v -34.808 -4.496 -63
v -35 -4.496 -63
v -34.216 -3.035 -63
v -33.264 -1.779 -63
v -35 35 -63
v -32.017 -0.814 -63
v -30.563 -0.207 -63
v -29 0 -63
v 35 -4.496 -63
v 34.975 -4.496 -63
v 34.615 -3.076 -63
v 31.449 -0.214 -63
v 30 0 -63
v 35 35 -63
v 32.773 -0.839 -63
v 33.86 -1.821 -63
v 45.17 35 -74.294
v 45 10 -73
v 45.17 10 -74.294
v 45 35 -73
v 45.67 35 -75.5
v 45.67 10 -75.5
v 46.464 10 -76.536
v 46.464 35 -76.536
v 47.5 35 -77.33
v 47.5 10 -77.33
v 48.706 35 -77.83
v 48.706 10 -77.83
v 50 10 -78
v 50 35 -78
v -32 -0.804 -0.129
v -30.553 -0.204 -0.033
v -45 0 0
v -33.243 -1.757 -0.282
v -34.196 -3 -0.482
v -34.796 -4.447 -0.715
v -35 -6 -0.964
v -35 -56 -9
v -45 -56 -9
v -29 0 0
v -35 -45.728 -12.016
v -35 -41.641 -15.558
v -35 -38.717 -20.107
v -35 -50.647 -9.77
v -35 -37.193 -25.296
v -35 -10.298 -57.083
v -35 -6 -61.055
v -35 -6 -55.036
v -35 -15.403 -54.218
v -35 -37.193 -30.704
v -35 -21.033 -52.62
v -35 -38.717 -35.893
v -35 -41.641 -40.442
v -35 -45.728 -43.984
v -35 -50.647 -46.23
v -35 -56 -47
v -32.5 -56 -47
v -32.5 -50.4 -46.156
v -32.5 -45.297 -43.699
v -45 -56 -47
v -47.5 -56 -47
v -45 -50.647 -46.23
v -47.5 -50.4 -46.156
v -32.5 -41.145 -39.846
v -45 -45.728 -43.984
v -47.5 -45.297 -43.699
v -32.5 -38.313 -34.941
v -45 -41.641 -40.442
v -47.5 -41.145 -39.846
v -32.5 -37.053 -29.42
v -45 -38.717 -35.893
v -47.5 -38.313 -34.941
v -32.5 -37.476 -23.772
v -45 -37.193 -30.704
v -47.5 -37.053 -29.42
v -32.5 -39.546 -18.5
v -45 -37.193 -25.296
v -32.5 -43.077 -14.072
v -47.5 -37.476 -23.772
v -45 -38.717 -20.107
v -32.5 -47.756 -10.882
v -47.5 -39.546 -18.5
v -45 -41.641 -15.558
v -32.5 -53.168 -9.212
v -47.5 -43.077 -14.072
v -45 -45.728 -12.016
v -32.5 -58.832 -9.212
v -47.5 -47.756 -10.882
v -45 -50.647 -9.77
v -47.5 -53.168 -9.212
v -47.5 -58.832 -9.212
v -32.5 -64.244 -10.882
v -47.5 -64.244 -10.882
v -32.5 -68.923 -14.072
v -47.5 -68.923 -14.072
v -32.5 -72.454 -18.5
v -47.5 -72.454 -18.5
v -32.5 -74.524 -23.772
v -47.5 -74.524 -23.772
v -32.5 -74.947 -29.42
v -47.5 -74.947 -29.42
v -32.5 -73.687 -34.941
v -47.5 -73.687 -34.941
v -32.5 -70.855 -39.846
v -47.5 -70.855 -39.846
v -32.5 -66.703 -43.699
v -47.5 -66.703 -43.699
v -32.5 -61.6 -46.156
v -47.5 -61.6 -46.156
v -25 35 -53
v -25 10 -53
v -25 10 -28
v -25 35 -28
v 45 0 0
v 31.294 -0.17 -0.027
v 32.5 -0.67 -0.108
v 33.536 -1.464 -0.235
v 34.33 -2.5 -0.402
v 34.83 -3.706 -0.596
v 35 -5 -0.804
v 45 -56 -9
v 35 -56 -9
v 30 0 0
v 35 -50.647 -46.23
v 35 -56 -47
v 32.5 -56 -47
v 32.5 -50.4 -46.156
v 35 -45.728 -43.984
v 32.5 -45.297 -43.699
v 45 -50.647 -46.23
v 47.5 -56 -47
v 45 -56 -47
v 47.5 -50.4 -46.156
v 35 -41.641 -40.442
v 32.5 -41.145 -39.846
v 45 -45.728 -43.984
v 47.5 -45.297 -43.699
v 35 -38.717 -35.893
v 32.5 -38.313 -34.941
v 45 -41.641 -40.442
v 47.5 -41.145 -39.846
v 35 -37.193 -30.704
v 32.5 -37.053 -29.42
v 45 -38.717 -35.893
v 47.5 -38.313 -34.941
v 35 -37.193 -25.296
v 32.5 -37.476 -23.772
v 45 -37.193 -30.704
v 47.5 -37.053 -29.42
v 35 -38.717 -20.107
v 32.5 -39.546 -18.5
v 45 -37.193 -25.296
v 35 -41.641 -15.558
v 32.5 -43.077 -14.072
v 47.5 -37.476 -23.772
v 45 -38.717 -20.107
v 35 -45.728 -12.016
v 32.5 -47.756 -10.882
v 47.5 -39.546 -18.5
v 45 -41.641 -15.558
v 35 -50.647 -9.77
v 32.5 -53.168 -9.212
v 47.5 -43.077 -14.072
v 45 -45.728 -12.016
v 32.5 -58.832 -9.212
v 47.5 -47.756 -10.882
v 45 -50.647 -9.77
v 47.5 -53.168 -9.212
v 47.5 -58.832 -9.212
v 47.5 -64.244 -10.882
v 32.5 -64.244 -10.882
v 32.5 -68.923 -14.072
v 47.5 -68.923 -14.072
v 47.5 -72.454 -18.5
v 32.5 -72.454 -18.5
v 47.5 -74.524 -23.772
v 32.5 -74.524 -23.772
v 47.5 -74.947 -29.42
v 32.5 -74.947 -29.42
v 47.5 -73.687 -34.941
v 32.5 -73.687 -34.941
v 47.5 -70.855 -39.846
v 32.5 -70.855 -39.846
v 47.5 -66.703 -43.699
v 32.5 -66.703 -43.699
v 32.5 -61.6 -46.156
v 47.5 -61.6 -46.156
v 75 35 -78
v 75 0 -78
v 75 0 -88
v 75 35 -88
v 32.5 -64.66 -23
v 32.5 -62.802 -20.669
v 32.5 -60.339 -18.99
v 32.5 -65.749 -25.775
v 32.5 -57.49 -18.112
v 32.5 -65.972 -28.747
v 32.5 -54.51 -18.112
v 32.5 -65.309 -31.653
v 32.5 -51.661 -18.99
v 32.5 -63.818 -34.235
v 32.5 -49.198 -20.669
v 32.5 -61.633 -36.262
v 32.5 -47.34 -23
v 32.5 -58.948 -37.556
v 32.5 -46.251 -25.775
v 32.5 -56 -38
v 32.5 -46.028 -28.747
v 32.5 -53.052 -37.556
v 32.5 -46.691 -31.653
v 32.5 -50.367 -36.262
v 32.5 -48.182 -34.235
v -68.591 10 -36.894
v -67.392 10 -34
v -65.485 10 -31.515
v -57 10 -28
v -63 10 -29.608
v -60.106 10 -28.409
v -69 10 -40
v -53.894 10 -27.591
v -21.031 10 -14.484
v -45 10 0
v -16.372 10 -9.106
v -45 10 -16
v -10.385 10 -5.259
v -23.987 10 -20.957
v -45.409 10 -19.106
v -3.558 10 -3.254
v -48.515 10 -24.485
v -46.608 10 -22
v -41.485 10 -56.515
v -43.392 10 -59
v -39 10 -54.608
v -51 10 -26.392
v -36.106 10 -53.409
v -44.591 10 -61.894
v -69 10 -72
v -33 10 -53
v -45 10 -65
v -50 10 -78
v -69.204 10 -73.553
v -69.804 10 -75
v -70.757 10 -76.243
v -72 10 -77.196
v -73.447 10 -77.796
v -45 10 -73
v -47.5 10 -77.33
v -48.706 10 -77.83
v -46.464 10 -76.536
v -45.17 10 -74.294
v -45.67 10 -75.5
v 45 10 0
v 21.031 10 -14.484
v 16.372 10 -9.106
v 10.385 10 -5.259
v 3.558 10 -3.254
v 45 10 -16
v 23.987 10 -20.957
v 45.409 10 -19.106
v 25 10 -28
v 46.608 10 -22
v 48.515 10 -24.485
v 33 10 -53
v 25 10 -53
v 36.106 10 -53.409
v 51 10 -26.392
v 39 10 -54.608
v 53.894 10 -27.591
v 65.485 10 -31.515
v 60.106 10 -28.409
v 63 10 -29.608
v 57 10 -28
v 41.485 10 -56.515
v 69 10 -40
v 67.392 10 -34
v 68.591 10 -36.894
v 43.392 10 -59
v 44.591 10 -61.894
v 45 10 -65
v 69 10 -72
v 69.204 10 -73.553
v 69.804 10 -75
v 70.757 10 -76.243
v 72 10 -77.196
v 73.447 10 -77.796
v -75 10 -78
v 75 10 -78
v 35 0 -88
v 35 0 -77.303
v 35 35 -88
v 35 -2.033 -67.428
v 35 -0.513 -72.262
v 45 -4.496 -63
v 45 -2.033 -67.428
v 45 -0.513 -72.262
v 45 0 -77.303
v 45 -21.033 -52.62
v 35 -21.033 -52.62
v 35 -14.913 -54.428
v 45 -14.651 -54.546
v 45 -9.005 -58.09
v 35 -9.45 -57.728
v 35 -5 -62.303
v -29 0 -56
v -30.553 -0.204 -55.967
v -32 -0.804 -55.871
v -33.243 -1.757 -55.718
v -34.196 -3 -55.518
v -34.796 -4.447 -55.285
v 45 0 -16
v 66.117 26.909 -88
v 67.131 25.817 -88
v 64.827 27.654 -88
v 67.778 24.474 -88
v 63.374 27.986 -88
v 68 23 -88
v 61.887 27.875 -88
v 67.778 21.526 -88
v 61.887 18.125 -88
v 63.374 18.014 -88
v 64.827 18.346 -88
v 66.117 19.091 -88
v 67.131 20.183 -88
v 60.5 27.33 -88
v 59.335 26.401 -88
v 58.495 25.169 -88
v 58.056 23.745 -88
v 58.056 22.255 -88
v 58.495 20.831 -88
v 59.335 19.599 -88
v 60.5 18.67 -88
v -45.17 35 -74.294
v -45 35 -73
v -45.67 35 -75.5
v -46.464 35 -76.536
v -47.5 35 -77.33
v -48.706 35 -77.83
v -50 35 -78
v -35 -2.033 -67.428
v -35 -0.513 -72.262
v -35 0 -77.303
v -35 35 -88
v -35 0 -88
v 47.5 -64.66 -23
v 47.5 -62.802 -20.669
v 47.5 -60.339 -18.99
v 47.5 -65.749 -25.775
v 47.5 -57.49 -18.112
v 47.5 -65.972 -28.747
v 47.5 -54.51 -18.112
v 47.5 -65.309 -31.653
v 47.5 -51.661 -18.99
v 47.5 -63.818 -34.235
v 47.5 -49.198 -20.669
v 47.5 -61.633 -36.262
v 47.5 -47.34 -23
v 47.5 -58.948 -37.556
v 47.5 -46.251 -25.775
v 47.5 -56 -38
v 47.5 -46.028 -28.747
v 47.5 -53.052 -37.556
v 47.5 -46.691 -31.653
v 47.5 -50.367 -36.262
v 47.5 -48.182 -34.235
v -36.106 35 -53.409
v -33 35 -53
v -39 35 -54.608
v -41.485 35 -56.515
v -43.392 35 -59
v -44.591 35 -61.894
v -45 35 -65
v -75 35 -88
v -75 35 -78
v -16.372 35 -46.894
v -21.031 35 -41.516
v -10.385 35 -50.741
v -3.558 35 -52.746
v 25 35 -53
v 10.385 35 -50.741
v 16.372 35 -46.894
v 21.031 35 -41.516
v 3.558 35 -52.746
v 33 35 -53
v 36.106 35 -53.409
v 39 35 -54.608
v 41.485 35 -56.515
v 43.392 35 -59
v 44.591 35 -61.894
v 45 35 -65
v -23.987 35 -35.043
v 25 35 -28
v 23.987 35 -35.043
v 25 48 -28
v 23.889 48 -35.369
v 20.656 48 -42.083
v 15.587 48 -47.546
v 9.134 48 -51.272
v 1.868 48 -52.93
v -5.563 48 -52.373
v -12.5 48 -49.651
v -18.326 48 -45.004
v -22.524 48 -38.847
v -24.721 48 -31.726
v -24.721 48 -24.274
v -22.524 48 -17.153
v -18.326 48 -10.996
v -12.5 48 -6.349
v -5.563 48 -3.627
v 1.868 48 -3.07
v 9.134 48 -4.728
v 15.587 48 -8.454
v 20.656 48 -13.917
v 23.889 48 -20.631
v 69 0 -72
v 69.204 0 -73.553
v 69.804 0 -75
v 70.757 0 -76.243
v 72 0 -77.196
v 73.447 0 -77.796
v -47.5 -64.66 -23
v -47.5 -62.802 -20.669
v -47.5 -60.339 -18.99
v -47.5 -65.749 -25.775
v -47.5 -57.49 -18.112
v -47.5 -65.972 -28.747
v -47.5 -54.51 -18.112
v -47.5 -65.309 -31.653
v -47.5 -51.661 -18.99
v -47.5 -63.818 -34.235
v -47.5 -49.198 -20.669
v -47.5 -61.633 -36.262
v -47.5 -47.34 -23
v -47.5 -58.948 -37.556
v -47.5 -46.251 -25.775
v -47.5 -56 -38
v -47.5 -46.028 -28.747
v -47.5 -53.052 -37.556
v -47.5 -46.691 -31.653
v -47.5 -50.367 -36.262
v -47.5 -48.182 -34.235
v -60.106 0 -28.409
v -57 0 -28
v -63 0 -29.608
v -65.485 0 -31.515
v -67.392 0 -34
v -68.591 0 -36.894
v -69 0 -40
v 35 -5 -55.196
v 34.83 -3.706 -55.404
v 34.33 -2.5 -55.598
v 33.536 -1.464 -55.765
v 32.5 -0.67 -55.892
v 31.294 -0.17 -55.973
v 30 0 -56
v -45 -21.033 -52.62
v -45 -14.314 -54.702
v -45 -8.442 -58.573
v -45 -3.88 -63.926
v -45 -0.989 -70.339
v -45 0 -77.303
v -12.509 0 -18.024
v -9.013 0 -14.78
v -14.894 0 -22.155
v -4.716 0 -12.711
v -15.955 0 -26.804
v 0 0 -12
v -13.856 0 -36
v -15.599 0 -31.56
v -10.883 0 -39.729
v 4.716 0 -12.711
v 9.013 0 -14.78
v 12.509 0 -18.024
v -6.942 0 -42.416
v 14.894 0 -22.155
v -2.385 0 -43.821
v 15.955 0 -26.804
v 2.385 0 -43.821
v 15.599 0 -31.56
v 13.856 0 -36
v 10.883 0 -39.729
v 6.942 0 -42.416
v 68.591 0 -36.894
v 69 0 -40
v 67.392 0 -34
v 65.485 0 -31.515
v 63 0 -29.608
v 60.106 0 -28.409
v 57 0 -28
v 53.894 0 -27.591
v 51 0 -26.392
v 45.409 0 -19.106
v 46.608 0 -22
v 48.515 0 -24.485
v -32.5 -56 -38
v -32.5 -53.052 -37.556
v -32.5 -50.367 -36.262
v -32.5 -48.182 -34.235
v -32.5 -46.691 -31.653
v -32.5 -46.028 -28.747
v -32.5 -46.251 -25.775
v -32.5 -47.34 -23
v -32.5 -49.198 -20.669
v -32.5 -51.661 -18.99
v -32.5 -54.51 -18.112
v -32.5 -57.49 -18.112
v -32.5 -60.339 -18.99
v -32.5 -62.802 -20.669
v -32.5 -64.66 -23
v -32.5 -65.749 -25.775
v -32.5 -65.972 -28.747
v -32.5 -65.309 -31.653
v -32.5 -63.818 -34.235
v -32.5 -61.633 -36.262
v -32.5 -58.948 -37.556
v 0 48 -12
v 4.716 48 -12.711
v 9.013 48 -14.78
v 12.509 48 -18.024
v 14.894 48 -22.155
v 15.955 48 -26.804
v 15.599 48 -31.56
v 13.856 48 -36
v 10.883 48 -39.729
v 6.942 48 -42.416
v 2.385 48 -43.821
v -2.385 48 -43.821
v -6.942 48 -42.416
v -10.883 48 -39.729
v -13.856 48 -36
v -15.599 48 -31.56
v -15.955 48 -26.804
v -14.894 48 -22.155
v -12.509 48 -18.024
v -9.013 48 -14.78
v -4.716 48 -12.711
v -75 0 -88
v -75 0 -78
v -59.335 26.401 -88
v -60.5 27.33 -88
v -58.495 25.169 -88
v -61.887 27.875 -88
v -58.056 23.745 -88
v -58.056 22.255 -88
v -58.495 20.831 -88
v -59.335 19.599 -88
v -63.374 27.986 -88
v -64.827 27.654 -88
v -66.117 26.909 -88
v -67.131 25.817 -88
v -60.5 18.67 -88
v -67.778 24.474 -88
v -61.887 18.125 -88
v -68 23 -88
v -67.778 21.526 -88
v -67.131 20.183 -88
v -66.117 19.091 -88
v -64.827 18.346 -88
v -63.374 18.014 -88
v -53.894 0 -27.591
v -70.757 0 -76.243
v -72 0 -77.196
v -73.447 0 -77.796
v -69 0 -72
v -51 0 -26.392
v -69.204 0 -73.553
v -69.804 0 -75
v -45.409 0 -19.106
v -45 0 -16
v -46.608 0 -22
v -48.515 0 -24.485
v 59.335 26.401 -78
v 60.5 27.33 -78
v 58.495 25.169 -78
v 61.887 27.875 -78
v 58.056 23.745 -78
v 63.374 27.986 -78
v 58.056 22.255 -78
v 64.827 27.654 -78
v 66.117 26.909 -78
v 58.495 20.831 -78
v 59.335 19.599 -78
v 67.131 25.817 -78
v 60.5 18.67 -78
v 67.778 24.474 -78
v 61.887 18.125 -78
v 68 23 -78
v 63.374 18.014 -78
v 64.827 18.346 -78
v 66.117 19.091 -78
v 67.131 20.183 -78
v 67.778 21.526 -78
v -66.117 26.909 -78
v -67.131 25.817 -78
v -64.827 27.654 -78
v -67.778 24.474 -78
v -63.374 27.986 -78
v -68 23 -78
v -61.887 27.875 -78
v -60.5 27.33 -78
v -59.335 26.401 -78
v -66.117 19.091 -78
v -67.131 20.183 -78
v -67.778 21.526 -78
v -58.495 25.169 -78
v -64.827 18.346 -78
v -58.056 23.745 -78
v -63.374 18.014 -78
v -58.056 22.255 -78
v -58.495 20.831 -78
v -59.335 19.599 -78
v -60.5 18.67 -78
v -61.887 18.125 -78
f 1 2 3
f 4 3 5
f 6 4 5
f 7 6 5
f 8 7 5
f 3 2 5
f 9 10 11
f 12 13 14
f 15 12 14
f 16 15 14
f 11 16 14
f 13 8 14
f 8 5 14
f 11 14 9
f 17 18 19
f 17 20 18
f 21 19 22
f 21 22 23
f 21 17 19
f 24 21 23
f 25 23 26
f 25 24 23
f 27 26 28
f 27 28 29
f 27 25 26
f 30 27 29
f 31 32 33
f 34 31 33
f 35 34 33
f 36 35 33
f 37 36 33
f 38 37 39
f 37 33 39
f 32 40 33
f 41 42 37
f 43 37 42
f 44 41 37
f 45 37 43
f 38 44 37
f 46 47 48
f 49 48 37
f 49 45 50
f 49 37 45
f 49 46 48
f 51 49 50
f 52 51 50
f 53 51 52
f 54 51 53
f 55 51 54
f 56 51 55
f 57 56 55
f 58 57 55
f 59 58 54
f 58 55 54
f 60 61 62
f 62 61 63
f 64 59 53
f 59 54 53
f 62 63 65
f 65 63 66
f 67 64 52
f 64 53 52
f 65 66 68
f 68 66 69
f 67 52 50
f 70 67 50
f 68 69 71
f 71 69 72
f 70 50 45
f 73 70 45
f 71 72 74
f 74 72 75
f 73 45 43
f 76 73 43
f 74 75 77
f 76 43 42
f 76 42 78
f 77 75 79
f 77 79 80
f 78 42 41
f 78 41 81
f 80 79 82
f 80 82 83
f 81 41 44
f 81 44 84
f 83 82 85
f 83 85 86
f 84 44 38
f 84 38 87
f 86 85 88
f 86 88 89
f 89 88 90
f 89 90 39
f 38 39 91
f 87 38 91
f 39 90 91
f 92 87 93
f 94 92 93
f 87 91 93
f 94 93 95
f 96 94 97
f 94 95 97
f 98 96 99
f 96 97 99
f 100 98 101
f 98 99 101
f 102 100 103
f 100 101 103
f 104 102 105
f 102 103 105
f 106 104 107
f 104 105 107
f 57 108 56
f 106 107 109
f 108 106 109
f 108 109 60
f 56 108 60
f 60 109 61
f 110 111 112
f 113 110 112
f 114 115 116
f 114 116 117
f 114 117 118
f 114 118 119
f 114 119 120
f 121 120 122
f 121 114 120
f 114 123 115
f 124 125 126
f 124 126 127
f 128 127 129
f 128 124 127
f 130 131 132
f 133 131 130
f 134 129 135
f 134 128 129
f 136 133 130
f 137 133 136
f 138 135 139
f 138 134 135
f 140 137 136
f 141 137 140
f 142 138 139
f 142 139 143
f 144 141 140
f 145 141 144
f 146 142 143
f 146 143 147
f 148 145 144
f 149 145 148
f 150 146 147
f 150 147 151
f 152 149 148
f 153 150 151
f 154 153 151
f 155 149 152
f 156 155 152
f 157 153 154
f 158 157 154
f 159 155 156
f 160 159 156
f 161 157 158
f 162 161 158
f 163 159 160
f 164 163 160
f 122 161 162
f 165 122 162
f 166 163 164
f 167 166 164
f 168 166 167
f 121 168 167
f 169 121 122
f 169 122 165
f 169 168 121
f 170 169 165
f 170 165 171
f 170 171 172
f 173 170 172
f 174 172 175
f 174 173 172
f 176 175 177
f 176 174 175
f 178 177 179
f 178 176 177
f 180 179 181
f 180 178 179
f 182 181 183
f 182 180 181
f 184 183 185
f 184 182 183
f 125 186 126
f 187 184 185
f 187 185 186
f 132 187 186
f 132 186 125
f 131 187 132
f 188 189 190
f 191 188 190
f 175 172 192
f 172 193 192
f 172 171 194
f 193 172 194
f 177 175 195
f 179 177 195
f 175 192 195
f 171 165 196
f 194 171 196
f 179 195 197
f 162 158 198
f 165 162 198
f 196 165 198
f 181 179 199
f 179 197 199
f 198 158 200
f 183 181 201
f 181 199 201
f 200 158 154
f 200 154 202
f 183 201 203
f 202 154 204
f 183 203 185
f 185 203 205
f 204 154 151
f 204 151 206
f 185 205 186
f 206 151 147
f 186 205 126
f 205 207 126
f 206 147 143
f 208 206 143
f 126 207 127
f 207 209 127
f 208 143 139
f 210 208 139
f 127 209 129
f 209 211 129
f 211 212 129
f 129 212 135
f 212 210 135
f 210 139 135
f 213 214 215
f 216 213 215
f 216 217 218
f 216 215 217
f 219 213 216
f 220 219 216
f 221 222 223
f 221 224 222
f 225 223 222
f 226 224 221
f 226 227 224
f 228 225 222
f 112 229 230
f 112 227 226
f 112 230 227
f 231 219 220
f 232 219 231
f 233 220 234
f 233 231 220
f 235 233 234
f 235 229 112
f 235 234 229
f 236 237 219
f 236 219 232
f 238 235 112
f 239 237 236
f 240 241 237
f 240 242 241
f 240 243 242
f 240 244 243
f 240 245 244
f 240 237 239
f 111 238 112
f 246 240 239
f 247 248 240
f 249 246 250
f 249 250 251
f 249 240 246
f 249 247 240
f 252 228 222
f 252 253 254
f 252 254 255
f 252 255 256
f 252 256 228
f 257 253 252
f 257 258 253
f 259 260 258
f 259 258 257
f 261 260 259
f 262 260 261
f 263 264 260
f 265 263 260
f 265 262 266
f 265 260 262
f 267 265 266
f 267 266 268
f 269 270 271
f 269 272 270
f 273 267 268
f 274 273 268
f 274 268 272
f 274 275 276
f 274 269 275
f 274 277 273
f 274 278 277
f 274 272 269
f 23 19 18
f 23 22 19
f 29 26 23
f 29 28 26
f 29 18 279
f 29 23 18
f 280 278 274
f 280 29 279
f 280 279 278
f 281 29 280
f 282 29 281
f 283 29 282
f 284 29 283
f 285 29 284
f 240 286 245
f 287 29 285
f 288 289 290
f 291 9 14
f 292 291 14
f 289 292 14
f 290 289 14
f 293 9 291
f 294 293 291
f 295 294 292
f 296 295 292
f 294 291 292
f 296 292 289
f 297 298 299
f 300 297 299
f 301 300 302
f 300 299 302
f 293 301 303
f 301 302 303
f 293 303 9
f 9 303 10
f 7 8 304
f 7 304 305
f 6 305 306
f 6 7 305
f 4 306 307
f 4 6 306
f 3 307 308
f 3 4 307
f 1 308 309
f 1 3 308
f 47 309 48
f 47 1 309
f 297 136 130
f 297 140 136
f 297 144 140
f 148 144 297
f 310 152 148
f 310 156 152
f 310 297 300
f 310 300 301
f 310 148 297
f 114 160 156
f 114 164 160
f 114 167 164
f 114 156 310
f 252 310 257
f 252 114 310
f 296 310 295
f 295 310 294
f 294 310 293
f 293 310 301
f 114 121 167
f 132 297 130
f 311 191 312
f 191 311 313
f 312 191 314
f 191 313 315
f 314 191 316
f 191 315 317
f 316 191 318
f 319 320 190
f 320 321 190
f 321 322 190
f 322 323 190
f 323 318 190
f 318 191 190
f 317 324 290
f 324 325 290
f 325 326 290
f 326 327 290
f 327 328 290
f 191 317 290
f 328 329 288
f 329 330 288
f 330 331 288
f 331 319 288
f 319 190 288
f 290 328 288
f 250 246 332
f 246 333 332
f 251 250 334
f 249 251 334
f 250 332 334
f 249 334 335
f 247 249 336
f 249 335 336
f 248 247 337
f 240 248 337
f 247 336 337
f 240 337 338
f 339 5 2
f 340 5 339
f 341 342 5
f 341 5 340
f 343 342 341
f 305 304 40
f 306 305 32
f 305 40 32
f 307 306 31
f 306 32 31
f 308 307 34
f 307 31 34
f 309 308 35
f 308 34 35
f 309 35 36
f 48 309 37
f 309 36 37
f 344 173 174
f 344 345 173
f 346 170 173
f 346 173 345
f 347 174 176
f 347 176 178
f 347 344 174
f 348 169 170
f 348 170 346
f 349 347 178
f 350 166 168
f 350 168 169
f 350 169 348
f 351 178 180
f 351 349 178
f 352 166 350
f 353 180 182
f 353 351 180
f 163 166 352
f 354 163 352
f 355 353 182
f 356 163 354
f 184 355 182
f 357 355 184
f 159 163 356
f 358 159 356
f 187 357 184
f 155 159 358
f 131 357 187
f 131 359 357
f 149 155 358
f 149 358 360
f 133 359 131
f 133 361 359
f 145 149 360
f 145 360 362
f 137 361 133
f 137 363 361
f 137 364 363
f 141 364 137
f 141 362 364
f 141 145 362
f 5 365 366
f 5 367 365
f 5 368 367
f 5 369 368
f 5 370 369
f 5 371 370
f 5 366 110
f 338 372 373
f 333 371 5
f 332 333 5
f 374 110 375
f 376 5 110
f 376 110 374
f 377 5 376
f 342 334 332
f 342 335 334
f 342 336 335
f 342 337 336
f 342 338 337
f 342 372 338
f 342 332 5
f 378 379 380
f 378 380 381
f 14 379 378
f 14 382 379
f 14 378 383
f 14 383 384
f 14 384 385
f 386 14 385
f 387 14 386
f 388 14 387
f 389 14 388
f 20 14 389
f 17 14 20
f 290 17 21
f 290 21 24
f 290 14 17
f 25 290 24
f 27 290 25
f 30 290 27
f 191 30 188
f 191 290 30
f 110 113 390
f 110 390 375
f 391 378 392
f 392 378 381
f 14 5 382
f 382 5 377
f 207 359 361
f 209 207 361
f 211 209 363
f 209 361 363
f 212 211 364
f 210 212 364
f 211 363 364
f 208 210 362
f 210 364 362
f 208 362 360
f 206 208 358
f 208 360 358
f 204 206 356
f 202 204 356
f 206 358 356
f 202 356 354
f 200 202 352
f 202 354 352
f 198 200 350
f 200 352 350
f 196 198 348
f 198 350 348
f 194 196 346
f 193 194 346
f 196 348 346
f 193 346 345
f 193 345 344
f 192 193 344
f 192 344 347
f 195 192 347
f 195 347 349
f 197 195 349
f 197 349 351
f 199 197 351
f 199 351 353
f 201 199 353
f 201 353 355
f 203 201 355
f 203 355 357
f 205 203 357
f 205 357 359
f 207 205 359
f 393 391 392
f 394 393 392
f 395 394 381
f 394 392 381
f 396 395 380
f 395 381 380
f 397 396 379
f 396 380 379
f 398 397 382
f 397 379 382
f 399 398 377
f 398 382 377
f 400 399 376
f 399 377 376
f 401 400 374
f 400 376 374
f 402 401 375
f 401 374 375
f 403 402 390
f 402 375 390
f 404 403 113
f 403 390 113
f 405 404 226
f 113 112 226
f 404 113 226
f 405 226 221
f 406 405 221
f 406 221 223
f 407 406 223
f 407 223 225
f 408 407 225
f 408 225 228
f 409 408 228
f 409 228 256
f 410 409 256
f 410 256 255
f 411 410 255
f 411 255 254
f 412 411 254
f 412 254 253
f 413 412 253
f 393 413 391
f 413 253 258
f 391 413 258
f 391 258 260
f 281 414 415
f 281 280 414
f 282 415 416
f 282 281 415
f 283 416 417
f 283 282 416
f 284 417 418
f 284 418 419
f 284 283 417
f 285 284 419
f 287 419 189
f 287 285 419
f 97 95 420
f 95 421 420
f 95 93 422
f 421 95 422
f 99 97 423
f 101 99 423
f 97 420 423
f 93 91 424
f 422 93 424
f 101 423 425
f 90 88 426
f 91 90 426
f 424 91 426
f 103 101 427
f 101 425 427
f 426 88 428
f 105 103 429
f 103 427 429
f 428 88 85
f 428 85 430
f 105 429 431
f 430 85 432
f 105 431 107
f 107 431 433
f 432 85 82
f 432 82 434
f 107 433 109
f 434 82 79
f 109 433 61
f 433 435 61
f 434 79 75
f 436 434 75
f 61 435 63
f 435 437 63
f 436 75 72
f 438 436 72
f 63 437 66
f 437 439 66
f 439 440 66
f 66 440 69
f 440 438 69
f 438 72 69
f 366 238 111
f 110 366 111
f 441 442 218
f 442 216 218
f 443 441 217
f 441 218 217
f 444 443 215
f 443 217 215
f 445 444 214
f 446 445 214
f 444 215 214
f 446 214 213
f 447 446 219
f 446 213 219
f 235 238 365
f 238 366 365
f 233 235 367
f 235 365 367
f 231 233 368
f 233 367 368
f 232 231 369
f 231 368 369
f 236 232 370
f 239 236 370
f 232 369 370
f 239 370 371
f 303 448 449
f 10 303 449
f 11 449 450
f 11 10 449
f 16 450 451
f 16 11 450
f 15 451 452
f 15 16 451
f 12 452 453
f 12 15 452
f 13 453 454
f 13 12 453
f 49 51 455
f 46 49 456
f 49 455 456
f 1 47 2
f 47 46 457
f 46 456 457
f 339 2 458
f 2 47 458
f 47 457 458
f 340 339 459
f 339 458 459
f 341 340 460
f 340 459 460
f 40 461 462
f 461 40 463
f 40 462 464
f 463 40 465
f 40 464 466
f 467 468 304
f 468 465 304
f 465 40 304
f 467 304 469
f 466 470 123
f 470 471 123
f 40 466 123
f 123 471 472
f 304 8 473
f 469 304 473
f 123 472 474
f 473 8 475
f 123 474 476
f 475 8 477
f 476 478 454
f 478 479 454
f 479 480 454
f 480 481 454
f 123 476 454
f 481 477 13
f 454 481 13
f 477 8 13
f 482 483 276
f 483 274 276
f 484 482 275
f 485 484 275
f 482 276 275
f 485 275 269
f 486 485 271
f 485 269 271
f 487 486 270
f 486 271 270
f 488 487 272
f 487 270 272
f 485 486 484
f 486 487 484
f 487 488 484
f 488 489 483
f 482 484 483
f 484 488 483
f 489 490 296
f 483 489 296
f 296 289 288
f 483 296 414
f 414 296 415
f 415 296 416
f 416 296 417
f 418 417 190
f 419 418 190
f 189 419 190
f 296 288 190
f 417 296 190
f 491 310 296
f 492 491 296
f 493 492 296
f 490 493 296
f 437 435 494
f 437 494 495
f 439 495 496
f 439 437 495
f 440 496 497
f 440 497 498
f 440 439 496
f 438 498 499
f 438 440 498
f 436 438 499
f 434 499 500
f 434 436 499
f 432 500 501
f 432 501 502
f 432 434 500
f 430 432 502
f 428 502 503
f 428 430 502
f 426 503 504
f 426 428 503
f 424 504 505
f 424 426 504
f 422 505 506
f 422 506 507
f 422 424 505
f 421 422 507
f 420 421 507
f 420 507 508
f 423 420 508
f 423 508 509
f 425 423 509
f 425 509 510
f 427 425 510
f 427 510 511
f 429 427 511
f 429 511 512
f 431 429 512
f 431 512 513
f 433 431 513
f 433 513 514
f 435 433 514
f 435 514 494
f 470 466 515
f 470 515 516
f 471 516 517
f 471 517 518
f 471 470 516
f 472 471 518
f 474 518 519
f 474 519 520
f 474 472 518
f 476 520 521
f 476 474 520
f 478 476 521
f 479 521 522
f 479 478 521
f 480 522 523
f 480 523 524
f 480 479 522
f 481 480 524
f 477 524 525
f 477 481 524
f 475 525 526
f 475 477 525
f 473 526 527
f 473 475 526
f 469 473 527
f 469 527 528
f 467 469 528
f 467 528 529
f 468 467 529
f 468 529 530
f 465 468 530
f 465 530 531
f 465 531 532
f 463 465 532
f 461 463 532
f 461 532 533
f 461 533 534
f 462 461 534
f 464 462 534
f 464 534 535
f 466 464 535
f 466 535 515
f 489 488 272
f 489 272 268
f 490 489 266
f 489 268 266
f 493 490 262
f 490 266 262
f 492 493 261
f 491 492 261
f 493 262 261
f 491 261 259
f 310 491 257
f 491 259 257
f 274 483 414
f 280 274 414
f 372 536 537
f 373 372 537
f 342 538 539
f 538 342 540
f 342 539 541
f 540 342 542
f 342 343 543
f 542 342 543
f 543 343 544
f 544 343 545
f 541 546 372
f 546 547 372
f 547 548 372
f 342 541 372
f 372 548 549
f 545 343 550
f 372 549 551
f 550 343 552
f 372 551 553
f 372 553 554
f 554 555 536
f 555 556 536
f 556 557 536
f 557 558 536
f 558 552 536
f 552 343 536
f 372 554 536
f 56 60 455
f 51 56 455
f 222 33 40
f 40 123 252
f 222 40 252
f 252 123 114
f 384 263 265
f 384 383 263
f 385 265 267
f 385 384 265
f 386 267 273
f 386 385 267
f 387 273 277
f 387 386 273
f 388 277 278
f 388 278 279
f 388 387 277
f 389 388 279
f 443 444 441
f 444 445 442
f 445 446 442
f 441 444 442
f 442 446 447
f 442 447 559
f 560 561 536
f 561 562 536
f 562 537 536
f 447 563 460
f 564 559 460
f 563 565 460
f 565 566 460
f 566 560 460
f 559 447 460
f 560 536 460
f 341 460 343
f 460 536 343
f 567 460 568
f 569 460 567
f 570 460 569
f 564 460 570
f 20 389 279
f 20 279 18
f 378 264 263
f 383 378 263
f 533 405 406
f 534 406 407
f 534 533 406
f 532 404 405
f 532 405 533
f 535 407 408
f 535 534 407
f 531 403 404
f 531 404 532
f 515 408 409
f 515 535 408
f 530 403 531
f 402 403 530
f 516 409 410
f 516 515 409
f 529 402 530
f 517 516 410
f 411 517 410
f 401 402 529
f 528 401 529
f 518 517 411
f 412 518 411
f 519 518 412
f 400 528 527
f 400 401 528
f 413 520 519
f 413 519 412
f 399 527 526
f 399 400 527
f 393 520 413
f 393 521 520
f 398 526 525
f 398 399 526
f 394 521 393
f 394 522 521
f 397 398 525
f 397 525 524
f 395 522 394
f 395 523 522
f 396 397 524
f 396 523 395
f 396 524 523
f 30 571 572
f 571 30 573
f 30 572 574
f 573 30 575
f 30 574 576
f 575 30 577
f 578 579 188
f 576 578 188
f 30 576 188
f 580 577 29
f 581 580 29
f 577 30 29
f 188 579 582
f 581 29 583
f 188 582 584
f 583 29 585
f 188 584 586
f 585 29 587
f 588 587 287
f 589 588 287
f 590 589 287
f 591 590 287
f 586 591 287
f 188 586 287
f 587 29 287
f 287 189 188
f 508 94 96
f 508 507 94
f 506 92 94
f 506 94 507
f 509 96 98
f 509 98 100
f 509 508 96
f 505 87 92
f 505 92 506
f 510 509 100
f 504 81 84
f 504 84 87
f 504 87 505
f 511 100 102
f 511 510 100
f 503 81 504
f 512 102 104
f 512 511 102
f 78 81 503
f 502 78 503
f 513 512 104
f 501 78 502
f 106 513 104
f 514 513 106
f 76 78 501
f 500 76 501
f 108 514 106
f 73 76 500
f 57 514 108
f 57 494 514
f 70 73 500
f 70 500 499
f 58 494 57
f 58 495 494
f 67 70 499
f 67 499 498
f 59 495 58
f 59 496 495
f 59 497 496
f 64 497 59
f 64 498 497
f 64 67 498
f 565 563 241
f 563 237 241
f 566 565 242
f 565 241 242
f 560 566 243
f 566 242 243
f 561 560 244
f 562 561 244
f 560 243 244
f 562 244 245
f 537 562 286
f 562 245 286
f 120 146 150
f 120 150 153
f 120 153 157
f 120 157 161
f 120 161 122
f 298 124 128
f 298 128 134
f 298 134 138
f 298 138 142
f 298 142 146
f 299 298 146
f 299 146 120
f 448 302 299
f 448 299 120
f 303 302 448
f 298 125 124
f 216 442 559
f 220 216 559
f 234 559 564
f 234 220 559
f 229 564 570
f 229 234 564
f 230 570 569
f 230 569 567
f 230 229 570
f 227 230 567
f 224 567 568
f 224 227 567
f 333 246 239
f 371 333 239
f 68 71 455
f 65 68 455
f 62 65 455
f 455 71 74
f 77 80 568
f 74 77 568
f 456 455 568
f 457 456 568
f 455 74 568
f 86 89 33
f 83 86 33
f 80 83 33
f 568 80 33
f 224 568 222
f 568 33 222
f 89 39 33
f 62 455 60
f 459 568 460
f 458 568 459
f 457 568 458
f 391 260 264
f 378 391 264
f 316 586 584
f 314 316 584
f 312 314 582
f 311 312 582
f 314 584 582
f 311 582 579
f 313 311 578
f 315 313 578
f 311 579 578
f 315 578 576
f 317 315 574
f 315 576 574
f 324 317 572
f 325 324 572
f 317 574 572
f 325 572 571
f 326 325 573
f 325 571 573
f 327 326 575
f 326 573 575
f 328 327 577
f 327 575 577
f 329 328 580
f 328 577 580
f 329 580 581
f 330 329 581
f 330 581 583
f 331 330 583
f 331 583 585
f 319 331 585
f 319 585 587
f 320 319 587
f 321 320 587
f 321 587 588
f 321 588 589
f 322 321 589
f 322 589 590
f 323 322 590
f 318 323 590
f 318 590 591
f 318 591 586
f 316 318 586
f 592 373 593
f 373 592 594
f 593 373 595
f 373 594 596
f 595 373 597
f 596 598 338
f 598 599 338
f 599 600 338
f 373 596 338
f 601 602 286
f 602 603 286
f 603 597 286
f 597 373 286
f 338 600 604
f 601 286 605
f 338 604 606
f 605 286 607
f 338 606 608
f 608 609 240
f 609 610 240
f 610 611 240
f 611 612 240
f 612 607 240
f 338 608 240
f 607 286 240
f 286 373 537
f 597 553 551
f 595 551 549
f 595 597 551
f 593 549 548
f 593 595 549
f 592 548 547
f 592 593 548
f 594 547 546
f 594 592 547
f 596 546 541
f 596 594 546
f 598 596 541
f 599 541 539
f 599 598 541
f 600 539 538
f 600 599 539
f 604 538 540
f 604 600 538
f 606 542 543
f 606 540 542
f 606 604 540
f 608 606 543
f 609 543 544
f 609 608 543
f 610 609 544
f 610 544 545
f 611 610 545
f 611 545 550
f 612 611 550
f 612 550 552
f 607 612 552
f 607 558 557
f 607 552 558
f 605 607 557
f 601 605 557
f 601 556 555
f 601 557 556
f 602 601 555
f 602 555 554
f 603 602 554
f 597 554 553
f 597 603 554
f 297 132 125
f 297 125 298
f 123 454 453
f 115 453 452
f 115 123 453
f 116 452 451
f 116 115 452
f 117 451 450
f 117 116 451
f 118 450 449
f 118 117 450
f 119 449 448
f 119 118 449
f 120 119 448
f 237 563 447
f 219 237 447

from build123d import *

# Parameters (mm, degrees)
SKETCH1_R           = 25
SKETCH1_R_2         = 16
BOSS_EXTRUDE1_DEPTH = 10
SKETCH1_8_R         = 25
SKETCH1_8_R_2       = 16
BOSS_EXTRUDE3_DEPTH = 35
SKETCH1_9_R         = 25
SKETCH1_9_R_2       = 16
BOSS_EXTRUDE4_DEPTH = 48
SKETCH7_R           = 10
BOSS_EXTRUDE5_DEPTH = 10
BOSS_EXTRUDE6_START = 2.5
SKETCH7_5_R         = 19
SKETCH7_5_R_2       = 10
BOSS_EXTRUDE6_DEPTH = 15
FILLET1_R           = 5
FILLET2_R           = 12
FILLET3_R           = 12
FILLET4_R           = 6
FILLET5_START       = 29.9999999
FILLET5_DEPTH       = 15.0000001
FILLET5_START_2     = 35
FILLET5_2_DEPTH     = 10
FILLET5_START_3     = -64
FILLET5_3_DEPTH     = 63.196428571
FILLET6_R           = 6
FILLET7_START       = -45
FILLET7_DEPTH       = 16
FILLET7_START_2     = -88
FILLET7_2_DEPTH     = 87.035714286
FILLET7_3_DEPTH     = 25
FILLET8_R           = 12
FILLET9_R           = 12
FILLET10_R          = 6
FILLET11_R          = 12
FILLET12_R          = 12
FILLET13_R          = 5
FILLET14_R          = 5
SKETCH11_R          = 5
CUT_EXTRUDE1_DEPTH  = 132.658649545


with BuildPart() as part:
    # Sketch1 → Boss-Extrude1 (new body)
    # profile 1 of 3: a face of its own
    with BuildSketch(Plane(origin=(0, 0, 0), x_dir=(1, 0, 0), z_dir=(0, 1, 0))):
        with BuildLine():
            Line((-45, 28), (-45, 0))
            Line((-45, 0), (45, 0))
            Line((45, 0), (45, 28))
            Line((45, 28), (69, 28))
            Line((69, 28), (69, 78))
            Line((69, 78), (45, 78))
            Line((45, 78), (45, 53))
            Line((45, 53), (25, 53))
            Line((25, 53), (25, 28))
            ThreePointArc((25, 28), (0, 3), (-25, 28))
            Line((-25, 28), (-25, 53))
            Line((-25, 53), (-45, 53))
            Line((-45, 53), (-45, 78))
            Line((-45, 78), (-69, 78))
            Line((-69, 78), (-69, 28))
            Line((-69, 28), (-45, 28))
        make_face()
    # profile 2 of 3: a face of its own
    with BuildSketch(Plane(origin=(0, 0, 0), x_dir=(1, 0, 0), z_dir=(0, 1, 0))):
        with Locations((0, 28)):
            Circle(SKETCH1_R)
        with Locations(Location((0, 28, 0), (0, 0, 270))):
            Circle(SKETCH1_R_2, mode=Mode.SUBTRACT)
    # profile 3 of 3: a face of its own
    with BuildSketch(Plane(origin=(0, 0, 0), x_dir=(1, 0, 0), z_dir=(0, 1, 0))):
        with BuildLine():
            Line((-75, 78), (-69, 78))
            Line((-69, 78), (-45, 78))
            Line((-45, 78), (-45, 53))
            Line((-45, 53), (-25, 53))
            Line((-25, 53), (-25, 28))
            ThreePointArc((-25, 28), (0, 53), (25, 28))
            Line((25, 28), (25, 53))
            Line((25, 53), (45, 53))
            Line((45, 53), (45, 78))
            Line((45, 78), (69, 78))
            Line((69, 78), (75, 78))
            Line((75, 78), (75, 88))
            Line((75, 88), (35, 88))
            Line((35, 88), (35, 63))
            Line((35, 63), (0, 63))
            Line((0, 63), (-35, 63))
            Line((-35, 63), (-35, 88))
            Line((-35, 88), (-75, 88))
            Line((-75, 88), (-75, 78))
        make_face()
    extrude(amount=BOSS_EXTRUDE1_DEPTH)

    # Sketch1<8> → Boss-Extrude3 (add)
    # profile 1 of 2: a face of its own
    with BuildSketch(Plane(origin=(0, 0, 0), x_dir=(1, 0, 0), z_dir=(0, 1, 0))):
        with BuildLine():
            Line((-75, 78), (-69, 78))
            Line((-69, 78), (-45, 78))
            Line((-45, 78), (-45, 53))
            Line((-45, 53), (-25, 53))
            Line((-25, 53), (-25, 28))
            ThreePointArc((-25, 28), (0, 53), (25, 28))
            Line((25, 28), (25, 53))
            Line((25, 53), (45, 53))
            Line((45, 53), (45, 78))
            Line((45, 78), (69, 78))
            Line((69, 78), (75, 78))
            Line((75, 78), (75, 88))
            Line((75, 88), (35, 88))
            Line((35, 88), (35, 63))
            Line((35, 63), (0, 63))
            Line((0, 63), (-35, 63))
            Line((-35, 63), (-35, 88))
            Line((-35, 88), (-75, 88))
            Line((-75, 88), (-75, 78))
        make_face()
    # profile 2 of 2: a face of its own
    with BuildSketch(Plane(origin=(0, 0, 0), x_dir=(1, 0, 0), z_dir=(0, 1, 0))):
        with Locations((0, 28)):
            Circle(SKETCH1_8_R)
        with Locations(Location((0, 28, 0), (0, 0, 270))):
            Circle(SKETCH1_8_R_2, mode=Mode.SUBTRACT)
    extrude(amount=BOSS_EXTRUDE3_DEPTH)

    # Sketch1<9> → Boss-Extrude4 (add)
    with BuildSketch(Plane(origin=(0, 0, 0), x_dir=(1, 0, 0), z_dir=(0, 1, 0))):
        with Locations((0, 28)):
            Circle(SKETCH1_9_R)
        with Locations(Location((0, 28, 0), (0, 0, 270))):
            Circle(SKETCH1_9_R_2, mode=Mode.SUBTRACT)
    extrude(amount=BOSS_EXTRUDE4_DEPTH)

    # Sketch7 → Boss-Extrude5 (add)
    with BuildSketch(Plane(origin=(45, 0, 0), x_dir=(0, 0, -1), z_dir=(1, 0, 0))):
        with BuildLine():
            Line((56, 0), (0, 0))
            Line((0, 0), (9, -56))
            ThreePointArc((9, -56), (28, -75), (47, -56))
            Line((47, -56), (56, 0))
        make_face()
        with Locations((28, -56)):
            Circle(SKETCH7_R, mode=Mode.SUBTRACT)
    boss_extrude5 = extrude(amount=-BOSS_EXTRUDE5_DEPTH)

    # Sketch7<5> → Boss-Extrude6 (add)
    with BuildSketch(Plane(origin=(45, 0, 0), x_dir=(0, 0, -1), z_dir=(1, 0, 0)).offset(BOSS_EXTRUDE6_START)):
        with Locations((28, -56)):
            Circle(SKETCH7_5_R)
        with Locations((28, -56)):
            Circle(SKETCH7_5_R_2, mode=Mode.SUBTRACT)
    boss_extrude6 = extrude(amount=-BOSS_EXTRUDE6_DEPTH)

    # Fillet1
    fillet1_edges = [part.edges().sort_by_distance(p)[0] for p in [
        (35, 0, -28),
    ]]
    fillet(fillet1_edges, radius=FILLET1_R)

    # Fillet2
    fillet2_edges = [part.edges().sort_by_distance(p)[0] for p in [
        (45, 5, -28),
    ]]
    fillet(fillet2_edges, radius=FILLET2_R)

    # Fillet3
    fillet3_edges = [part.edges().sort_by_distance(p)[0] for p in [
        (69, 5, -28),
    ]]
    fillet(fillet3_edges, radius=FILLET3_R - 0.0001)  # a hair under: the kernel refuses the full size

    # Fillet4
    fillet4_edges = [part.edges().sort_by_distance(p)[0] for p in [
        (69, 5, -78),
    ]]
    fillet(fillet4_edges, radius=FILLET4_R - 0.0001)  # a hair under: the kernel refuses the full size

    # Fillet5: read off the stored shape, not the designer's step
    # Fillet5 outline → Fillet5 (add)
    with BuildSketch(Plane.YZ.offset(FILLET5_START)):
        with BuildLine():
            ThreePointArc((-21.033047615, -52.619688776), (-11.709098144, -56.128625688), (-4.495715646, -63))
            Line((-4.495715646, -63), (0, -63))
            Line((0, -63), (0, -56))
            Line((0, -56), (-21.033047615, -52.619688776))
        make_face()
    extrude(amount=FILLET5_DEPTH)

    # Fillet5 2 outline → Fillet5 2 (add)
    with BuildSketch(Plane.YZ.offset(FILLET5_START_2)):
        with BuildLine():
            ThreePointArc((-4.495715646, -63), (-1.150397185, -69.806519203), (0, -77.302948058))
            Line((0, -77.302948058), (0, -63))
            Line((0, -63), (-4.495715646, -63))
        make_face()
    extrude(amount=FILLET5_2_DEPTH)

    # Fillet5 3 outline → Fillet5 3 (cut)
    with BuildSketch(Plane.XY.offset(FILLET5_START_3)):
        with BuildLine():
            Line((29.9999999, -23), (35, -23))
            Line((35, -23), (35, -5))
            ThreePointArc((35, -5), (33.535533906, -1.464466094), (30, 0))
            Line((30, 0), (29.9999999, -23))
        make_face()
    extrude(amount=FILLET5_3_DEPTH, mode=Mode.SUBTRACT)

    # Mirror2: Boss-Extrude5, Boss-Extrude6 across plane
    add(boss_extrude5.mirror(Plane(origin=(0, 0, 0), x_dir=(0, 0, 1), z_dir=(1, 0, 0))))
    add(boss_extrude6.mirror(Plane(origin=(0, 0, 0), x_dir=(0, 0, 1), z_dir=(1, 0, 0))))

    # Fillet6
    fillet6_edges = [part.edges().sort_by_distance(p)[0] for p in [
        (-35, 0, -28),
    ]]
    fillet(fillet6_edges, radius=FILLET6_R)

    # Fillet7: read off the stored shape, not the designer's step
    # Fillet7 outline → Fillet7 (add)
    with BuildSketch(Plane.YZ.offset(FILLET7_START)):
        with BuildLine():
            ThreePointArc((-21.033047615, -52.619688776), (-5.971418739, -61.088352929), (0, -77.302948058))
            Line((0, -77.302948058), (0, -56))
            Line((0, -56), (-21.033047615, -52.619688776))
        make_face()
    extrude(amount=FILLET7_DEPTH)

    # Fillet7 2 outline → Fillet7 2 (cut)
    with BuildSketch(Plane.XY.offset(FILLET7_START_2)):
        with BuildLine():
            Line((-29, -23), (-29, 0))
            ThreePointArc((-29, 0), (-33.242640687, -1.757359313), (-35, -6))
            Line((-35, -6), (-35, -23))
            Line((-35, -23), (-29, -23))
        make_face()
    extrude(amount=FILLET7_2_DEPTH, mode=Mode.SUBTRACT)

    # Fillet7 3 outline → Fillet7 3 (cut)
    with BuildSketch(Plane.XY.offset(FILLET7_START_2)):
        with BuildLine():
            Line((-29, 0), (-35, 0))
            Line((-35, 0), (-35, -6))
            ThreePointArc((-35, -6), (-33.242640687, -1.757359313), (-29, 0))
        make_face()
    extrude(amount=FILLET7_3_DEPTH, mode=Mode.SUBTRACT)

    # Fillet8
    fillet8_edges = [part.edges().sort_by_distance(p)[0] for p in [
        (-45, 5, -28),
    ]]
    fillet(fillet8_edges, radius=FILLET8_R)

    # Fillet9
    fillet9_edges = [part.edges().sort_by_distance(p)[0] for p in [
        (-69, 5, -28),
    ]]
    fillet(fillet9_edges, radius=FILLET9_R - 0.0001)  # a hair under: the kernel refuses the full size

    # Fillet10
    fillet10_edges = [part.edges().sort_by_distance(p)[0] for p in [
        (-69, 5, -78),
    ]]
    fillet(fillet10_edges, radius=FILLET10_R - 0.0001)  # a hair under: the kernel refuses the full size

    # Fillet11
    fillet11_edges = [part.edges().sort_by_distance(p)[0] for p in [
        (45, 22.5, -53),
    ]]
    fillet(fillet11_edges, radius=FILLET11_R)

    # Fillet12
    fillet12_edges = [part.edges().sort_by_distance(p)[0] for p in [
        (-45, 22.5, -53),
    ]]
    fillet(fillet12_edges, radius=FILLET12_R)

    # Fillet13
    fillet13_edges = [part.edges().sort_by_distance(p)[0] for p in [
        (45, 22.5, -78),
    ]]
    fillet(fillet13_edges, radius=FILLET13_R)

    # Fillet14
    fillet14_edges = [part.edges().sort_by_distance(p)[0] for p in [
        (-45, 22.5, -78),
    ]]
    fillet(fillet14_edges, radius=FILLET14_R)

    # Sketch11 → Cut-Extrude1 (cut, through all)
    with BuildSketch(Plane.XY.offset(-78)):
        with Locations((63, 23)):
            Circle(SKETCH11_R)
    cut_extrude1 = extrude(amount=-CUT_EXTRUDE1_DEPTH, mode=Mode.SUBTRACT)

    # Mirror8: Cut-Extrude1 across plane
    add(cut_extrude1.mirror(Plane(origin=(0, 0, 0), x_dir=(0, 0, 1), z_dir=(1, 0, 0))), mode=Mode.SUBTRACT)


solid = part.part
